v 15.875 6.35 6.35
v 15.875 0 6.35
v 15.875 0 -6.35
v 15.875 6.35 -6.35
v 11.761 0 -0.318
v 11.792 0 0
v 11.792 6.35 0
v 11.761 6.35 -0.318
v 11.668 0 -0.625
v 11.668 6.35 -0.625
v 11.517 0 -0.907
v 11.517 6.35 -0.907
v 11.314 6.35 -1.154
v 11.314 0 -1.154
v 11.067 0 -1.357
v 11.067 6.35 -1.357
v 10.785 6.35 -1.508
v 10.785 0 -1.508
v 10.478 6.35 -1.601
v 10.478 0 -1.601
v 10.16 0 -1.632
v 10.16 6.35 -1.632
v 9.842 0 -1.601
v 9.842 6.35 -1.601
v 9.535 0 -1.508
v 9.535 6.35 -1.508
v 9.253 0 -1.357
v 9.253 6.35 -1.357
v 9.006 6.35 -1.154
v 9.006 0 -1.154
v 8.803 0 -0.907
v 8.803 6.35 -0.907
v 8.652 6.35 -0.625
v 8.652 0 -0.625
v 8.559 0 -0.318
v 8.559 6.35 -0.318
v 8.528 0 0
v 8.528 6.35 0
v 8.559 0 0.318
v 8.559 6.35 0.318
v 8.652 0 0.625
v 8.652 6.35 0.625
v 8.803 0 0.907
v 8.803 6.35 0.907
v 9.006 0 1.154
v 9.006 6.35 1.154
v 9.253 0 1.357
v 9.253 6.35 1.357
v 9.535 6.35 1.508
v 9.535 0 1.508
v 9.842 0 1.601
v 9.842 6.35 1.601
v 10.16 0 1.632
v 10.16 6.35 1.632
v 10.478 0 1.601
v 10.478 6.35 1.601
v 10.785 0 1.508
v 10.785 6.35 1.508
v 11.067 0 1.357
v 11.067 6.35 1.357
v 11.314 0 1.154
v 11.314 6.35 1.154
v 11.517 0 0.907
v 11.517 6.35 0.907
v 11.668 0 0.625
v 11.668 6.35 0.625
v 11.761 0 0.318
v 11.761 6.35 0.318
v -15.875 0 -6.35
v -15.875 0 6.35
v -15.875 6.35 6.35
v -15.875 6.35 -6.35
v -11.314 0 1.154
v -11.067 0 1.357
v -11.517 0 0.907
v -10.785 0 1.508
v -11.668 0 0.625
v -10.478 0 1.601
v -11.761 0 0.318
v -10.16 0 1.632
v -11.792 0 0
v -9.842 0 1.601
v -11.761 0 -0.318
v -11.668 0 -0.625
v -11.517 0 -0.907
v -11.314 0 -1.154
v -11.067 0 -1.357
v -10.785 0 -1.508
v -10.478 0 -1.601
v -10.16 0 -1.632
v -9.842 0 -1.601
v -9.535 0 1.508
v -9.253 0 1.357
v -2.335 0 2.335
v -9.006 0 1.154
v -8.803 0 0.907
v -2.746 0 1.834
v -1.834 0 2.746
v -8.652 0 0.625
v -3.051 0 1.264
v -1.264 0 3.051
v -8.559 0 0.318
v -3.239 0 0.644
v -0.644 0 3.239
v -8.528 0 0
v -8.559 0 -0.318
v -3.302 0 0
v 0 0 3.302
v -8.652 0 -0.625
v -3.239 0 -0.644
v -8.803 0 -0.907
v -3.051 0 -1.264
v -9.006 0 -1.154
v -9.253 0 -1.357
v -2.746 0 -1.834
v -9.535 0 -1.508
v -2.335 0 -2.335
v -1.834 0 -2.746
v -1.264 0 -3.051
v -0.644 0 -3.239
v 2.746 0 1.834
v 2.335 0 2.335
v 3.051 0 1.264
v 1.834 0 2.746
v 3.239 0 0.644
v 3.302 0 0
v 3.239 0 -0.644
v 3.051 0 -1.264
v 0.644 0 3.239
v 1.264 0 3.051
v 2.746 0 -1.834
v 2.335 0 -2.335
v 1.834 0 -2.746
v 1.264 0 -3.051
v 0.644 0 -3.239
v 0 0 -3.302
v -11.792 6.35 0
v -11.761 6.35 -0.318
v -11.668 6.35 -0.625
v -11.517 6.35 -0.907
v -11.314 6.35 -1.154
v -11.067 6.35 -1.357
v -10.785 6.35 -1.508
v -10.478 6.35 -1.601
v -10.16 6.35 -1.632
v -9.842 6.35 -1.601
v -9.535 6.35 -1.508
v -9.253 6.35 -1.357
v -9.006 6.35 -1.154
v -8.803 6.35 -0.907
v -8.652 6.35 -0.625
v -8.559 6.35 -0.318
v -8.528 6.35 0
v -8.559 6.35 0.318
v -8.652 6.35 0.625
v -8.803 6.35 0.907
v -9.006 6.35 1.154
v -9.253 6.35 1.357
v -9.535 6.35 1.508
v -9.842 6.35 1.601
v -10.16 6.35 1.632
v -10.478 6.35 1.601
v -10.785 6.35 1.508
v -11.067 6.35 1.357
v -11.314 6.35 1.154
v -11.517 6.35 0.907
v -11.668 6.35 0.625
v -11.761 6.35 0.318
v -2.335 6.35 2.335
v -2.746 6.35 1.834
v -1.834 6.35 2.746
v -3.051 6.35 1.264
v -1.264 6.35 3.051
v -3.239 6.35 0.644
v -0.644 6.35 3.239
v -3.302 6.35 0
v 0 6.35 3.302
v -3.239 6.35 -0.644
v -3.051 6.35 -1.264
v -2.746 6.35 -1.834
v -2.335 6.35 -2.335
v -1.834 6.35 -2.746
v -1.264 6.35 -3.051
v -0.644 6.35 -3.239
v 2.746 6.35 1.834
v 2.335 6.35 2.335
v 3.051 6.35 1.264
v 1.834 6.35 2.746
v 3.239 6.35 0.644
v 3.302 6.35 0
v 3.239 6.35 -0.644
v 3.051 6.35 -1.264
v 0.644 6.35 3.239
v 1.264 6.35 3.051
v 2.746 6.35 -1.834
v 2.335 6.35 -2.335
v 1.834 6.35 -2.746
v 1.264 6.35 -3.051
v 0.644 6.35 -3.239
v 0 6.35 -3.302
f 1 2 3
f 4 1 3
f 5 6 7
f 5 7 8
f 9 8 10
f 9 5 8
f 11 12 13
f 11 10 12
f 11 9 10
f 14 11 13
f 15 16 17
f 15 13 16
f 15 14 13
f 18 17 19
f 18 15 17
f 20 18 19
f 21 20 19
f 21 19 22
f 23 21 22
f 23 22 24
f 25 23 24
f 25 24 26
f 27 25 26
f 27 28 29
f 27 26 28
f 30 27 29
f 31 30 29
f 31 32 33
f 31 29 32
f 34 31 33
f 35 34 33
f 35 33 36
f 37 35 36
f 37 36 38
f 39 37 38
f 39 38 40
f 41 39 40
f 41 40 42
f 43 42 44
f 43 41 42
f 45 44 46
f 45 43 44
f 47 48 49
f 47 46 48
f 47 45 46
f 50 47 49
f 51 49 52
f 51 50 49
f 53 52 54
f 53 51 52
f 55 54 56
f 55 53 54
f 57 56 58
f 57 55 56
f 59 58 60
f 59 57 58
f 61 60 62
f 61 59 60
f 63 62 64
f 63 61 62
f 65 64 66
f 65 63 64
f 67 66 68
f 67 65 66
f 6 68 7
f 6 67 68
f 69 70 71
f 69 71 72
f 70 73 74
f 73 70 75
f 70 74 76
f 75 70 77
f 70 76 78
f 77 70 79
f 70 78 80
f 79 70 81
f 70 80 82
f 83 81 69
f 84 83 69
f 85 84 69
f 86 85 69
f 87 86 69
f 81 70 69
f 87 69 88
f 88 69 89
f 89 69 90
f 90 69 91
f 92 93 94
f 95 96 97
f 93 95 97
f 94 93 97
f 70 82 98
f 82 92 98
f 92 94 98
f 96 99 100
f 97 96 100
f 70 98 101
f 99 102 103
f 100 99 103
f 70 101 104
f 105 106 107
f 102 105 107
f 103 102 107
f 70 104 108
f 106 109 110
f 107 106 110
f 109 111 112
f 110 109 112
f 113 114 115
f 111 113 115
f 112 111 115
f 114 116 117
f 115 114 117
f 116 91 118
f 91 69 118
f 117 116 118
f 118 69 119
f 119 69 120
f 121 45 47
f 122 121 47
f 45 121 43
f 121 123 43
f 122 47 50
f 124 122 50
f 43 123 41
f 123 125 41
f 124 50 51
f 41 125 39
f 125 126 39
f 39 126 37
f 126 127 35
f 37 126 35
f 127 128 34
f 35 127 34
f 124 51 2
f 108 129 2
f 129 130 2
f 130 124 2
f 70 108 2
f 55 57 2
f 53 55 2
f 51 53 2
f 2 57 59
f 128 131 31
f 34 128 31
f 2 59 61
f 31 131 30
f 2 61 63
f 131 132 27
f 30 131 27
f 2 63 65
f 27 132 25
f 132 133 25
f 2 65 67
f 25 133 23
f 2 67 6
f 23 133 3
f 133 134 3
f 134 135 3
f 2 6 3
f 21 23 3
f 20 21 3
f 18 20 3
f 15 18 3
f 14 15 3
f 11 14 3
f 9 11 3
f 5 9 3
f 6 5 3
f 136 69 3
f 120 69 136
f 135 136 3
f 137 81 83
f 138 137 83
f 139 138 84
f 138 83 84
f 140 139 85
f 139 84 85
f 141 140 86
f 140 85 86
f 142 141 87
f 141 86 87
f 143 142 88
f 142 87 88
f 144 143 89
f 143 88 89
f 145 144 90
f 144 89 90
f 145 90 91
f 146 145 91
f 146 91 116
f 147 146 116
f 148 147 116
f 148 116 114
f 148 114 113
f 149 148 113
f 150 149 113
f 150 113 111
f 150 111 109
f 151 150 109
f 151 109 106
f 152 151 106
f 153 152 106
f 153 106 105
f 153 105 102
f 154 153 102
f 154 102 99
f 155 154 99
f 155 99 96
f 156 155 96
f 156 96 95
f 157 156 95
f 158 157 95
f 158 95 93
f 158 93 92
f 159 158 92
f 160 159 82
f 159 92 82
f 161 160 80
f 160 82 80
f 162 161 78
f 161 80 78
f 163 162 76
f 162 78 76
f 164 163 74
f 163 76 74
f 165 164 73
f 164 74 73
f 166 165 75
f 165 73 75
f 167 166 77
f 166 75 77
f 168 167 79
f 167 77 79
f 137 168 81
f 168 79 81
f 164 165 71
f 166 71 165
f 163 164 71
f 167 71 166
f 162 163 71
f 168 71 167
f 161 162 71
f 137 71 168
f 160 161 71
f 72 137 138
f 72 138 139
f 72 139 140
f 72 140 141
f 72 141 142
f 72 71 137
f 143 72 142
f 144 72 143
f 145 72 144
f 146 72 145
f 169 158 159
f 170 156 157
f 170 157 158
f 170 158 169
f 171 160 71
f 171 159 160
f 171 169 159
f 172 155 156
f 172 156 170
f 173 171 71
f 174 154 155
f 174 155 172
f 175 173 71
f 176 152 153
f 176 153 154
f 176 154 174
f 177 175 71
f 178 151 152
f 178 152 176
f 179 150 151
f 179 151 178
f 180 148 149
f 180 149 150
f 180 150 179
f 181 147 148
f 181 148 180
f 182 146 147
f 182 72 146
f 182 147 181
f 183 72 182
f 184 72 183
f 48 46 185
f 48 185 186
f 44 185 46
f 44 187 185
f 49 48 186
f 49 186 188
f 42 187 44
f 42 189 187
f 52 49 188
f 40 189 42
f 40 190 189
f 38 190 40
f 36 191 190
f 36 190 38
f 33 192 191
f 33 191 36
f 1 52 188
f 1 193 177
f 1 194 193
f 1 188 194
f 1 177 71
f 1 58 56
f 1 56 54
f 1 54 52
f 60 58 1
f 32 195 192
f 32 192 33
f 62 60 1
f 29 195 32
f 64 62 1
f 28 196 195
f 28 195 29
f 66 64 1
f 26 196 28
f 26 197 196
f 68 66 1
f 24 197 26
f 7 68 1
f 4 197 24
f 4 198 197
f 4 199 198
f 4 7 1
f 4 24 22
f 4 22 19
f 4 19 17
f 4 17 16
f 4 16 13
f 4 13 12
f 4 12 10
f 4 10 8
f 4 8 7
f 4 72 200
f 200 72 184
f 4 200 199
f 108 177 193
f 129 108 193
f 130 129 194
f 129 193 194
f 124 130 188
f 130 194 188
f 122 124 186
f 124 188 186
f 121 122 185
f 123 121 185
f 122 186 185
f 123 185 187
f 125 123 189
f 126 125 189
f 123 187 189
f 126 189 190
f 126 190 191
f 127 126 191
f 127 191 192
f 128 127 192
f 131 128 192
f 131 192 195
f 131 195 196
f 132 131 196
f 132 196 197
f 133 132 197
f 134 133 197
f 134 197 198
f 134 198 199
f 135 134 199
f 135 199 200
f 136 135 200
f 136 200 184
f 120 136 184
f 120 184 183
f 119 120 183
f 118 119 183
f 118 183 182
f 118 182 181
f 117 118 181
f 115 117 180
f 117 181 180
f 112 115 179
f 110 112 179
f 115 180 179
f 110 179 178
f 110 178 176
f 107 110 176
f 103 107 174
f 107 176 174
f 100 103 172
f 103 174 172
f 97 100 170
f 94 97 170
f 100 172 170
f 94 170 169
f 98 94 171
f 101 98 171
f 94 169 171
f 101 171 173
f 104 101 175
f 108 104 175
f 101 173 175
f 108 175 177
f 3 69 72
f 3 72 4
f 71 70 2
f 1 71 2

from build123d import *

# Parameters (mm, degrees)
SKETCH1_W             = 31.75
SKETCH1_H             = 12.7
BOSS_EXTRUDE1_DEPTH   = 6.35
CUT_EXTRUDE1_REACH    = 20.239
SKETCH2_R             = 3.302
F_4_CLEARANCE_HOLE1_D = 3.2639


with BuildPart() as part:
    # Sketch1 → Boss-Extrude1 (new body)
    with BuildSketch(Plane(origin=(0, 0, 0), x_dir=(1, 0, 0), z_dir=(0, 1, 0))):
        Rectangle(SKETCH1_W, SKETCH1_H)
    extrude(amount=BOSS_EXTRUDE1_DEPTH)

    # Sketch2 → Cut-Extrude1 (cut, up to next)
    with BuildSketch(Plane(origin=(0, 6.35, 0), x_dir=(1, 0, 0), z_dir=(0, 1, 0)), mode=Mode.PRIVATE) as cut_extrude1_sk1:
        with Locations(Location((0, 0, 0), (0, 0, 270))):
            Circle(SKETCH2_R)
    cut_extrude1_tool1 = extrude(cut_extrude1_sk1.sketch, amount=-CUT_EXTRUDE1_REACH, mode=Mode.PRIVATE) & part.part
    add(cut_extrude1_tool1.solids().sort_by_distance((0, 6.35, 0))[0], mode=Mode.SUBTRACT)

    # #4 Clearance Hole1 (through all)
    with Locations(Plane(origin=(0, 6.35, 0), x_dir=(1, 0, 0), z_dir=(0, 1, 0))):
        with Locations((-10.16, 0)):
            f_4_clearance_hole1 = Hole(F_4_CLEARANCE_HOLE1_D / 2)

    # Mirror1: #4 Clearance Hole1 across plane
    add(f_4_clearance_hole1.mirror(Plane(origin=(0, 0, 0), x_dir=(0, 0, 1), z_dir=(1, 0, 0))), mode=Mode.SUBTRACT)


solid = part.part
